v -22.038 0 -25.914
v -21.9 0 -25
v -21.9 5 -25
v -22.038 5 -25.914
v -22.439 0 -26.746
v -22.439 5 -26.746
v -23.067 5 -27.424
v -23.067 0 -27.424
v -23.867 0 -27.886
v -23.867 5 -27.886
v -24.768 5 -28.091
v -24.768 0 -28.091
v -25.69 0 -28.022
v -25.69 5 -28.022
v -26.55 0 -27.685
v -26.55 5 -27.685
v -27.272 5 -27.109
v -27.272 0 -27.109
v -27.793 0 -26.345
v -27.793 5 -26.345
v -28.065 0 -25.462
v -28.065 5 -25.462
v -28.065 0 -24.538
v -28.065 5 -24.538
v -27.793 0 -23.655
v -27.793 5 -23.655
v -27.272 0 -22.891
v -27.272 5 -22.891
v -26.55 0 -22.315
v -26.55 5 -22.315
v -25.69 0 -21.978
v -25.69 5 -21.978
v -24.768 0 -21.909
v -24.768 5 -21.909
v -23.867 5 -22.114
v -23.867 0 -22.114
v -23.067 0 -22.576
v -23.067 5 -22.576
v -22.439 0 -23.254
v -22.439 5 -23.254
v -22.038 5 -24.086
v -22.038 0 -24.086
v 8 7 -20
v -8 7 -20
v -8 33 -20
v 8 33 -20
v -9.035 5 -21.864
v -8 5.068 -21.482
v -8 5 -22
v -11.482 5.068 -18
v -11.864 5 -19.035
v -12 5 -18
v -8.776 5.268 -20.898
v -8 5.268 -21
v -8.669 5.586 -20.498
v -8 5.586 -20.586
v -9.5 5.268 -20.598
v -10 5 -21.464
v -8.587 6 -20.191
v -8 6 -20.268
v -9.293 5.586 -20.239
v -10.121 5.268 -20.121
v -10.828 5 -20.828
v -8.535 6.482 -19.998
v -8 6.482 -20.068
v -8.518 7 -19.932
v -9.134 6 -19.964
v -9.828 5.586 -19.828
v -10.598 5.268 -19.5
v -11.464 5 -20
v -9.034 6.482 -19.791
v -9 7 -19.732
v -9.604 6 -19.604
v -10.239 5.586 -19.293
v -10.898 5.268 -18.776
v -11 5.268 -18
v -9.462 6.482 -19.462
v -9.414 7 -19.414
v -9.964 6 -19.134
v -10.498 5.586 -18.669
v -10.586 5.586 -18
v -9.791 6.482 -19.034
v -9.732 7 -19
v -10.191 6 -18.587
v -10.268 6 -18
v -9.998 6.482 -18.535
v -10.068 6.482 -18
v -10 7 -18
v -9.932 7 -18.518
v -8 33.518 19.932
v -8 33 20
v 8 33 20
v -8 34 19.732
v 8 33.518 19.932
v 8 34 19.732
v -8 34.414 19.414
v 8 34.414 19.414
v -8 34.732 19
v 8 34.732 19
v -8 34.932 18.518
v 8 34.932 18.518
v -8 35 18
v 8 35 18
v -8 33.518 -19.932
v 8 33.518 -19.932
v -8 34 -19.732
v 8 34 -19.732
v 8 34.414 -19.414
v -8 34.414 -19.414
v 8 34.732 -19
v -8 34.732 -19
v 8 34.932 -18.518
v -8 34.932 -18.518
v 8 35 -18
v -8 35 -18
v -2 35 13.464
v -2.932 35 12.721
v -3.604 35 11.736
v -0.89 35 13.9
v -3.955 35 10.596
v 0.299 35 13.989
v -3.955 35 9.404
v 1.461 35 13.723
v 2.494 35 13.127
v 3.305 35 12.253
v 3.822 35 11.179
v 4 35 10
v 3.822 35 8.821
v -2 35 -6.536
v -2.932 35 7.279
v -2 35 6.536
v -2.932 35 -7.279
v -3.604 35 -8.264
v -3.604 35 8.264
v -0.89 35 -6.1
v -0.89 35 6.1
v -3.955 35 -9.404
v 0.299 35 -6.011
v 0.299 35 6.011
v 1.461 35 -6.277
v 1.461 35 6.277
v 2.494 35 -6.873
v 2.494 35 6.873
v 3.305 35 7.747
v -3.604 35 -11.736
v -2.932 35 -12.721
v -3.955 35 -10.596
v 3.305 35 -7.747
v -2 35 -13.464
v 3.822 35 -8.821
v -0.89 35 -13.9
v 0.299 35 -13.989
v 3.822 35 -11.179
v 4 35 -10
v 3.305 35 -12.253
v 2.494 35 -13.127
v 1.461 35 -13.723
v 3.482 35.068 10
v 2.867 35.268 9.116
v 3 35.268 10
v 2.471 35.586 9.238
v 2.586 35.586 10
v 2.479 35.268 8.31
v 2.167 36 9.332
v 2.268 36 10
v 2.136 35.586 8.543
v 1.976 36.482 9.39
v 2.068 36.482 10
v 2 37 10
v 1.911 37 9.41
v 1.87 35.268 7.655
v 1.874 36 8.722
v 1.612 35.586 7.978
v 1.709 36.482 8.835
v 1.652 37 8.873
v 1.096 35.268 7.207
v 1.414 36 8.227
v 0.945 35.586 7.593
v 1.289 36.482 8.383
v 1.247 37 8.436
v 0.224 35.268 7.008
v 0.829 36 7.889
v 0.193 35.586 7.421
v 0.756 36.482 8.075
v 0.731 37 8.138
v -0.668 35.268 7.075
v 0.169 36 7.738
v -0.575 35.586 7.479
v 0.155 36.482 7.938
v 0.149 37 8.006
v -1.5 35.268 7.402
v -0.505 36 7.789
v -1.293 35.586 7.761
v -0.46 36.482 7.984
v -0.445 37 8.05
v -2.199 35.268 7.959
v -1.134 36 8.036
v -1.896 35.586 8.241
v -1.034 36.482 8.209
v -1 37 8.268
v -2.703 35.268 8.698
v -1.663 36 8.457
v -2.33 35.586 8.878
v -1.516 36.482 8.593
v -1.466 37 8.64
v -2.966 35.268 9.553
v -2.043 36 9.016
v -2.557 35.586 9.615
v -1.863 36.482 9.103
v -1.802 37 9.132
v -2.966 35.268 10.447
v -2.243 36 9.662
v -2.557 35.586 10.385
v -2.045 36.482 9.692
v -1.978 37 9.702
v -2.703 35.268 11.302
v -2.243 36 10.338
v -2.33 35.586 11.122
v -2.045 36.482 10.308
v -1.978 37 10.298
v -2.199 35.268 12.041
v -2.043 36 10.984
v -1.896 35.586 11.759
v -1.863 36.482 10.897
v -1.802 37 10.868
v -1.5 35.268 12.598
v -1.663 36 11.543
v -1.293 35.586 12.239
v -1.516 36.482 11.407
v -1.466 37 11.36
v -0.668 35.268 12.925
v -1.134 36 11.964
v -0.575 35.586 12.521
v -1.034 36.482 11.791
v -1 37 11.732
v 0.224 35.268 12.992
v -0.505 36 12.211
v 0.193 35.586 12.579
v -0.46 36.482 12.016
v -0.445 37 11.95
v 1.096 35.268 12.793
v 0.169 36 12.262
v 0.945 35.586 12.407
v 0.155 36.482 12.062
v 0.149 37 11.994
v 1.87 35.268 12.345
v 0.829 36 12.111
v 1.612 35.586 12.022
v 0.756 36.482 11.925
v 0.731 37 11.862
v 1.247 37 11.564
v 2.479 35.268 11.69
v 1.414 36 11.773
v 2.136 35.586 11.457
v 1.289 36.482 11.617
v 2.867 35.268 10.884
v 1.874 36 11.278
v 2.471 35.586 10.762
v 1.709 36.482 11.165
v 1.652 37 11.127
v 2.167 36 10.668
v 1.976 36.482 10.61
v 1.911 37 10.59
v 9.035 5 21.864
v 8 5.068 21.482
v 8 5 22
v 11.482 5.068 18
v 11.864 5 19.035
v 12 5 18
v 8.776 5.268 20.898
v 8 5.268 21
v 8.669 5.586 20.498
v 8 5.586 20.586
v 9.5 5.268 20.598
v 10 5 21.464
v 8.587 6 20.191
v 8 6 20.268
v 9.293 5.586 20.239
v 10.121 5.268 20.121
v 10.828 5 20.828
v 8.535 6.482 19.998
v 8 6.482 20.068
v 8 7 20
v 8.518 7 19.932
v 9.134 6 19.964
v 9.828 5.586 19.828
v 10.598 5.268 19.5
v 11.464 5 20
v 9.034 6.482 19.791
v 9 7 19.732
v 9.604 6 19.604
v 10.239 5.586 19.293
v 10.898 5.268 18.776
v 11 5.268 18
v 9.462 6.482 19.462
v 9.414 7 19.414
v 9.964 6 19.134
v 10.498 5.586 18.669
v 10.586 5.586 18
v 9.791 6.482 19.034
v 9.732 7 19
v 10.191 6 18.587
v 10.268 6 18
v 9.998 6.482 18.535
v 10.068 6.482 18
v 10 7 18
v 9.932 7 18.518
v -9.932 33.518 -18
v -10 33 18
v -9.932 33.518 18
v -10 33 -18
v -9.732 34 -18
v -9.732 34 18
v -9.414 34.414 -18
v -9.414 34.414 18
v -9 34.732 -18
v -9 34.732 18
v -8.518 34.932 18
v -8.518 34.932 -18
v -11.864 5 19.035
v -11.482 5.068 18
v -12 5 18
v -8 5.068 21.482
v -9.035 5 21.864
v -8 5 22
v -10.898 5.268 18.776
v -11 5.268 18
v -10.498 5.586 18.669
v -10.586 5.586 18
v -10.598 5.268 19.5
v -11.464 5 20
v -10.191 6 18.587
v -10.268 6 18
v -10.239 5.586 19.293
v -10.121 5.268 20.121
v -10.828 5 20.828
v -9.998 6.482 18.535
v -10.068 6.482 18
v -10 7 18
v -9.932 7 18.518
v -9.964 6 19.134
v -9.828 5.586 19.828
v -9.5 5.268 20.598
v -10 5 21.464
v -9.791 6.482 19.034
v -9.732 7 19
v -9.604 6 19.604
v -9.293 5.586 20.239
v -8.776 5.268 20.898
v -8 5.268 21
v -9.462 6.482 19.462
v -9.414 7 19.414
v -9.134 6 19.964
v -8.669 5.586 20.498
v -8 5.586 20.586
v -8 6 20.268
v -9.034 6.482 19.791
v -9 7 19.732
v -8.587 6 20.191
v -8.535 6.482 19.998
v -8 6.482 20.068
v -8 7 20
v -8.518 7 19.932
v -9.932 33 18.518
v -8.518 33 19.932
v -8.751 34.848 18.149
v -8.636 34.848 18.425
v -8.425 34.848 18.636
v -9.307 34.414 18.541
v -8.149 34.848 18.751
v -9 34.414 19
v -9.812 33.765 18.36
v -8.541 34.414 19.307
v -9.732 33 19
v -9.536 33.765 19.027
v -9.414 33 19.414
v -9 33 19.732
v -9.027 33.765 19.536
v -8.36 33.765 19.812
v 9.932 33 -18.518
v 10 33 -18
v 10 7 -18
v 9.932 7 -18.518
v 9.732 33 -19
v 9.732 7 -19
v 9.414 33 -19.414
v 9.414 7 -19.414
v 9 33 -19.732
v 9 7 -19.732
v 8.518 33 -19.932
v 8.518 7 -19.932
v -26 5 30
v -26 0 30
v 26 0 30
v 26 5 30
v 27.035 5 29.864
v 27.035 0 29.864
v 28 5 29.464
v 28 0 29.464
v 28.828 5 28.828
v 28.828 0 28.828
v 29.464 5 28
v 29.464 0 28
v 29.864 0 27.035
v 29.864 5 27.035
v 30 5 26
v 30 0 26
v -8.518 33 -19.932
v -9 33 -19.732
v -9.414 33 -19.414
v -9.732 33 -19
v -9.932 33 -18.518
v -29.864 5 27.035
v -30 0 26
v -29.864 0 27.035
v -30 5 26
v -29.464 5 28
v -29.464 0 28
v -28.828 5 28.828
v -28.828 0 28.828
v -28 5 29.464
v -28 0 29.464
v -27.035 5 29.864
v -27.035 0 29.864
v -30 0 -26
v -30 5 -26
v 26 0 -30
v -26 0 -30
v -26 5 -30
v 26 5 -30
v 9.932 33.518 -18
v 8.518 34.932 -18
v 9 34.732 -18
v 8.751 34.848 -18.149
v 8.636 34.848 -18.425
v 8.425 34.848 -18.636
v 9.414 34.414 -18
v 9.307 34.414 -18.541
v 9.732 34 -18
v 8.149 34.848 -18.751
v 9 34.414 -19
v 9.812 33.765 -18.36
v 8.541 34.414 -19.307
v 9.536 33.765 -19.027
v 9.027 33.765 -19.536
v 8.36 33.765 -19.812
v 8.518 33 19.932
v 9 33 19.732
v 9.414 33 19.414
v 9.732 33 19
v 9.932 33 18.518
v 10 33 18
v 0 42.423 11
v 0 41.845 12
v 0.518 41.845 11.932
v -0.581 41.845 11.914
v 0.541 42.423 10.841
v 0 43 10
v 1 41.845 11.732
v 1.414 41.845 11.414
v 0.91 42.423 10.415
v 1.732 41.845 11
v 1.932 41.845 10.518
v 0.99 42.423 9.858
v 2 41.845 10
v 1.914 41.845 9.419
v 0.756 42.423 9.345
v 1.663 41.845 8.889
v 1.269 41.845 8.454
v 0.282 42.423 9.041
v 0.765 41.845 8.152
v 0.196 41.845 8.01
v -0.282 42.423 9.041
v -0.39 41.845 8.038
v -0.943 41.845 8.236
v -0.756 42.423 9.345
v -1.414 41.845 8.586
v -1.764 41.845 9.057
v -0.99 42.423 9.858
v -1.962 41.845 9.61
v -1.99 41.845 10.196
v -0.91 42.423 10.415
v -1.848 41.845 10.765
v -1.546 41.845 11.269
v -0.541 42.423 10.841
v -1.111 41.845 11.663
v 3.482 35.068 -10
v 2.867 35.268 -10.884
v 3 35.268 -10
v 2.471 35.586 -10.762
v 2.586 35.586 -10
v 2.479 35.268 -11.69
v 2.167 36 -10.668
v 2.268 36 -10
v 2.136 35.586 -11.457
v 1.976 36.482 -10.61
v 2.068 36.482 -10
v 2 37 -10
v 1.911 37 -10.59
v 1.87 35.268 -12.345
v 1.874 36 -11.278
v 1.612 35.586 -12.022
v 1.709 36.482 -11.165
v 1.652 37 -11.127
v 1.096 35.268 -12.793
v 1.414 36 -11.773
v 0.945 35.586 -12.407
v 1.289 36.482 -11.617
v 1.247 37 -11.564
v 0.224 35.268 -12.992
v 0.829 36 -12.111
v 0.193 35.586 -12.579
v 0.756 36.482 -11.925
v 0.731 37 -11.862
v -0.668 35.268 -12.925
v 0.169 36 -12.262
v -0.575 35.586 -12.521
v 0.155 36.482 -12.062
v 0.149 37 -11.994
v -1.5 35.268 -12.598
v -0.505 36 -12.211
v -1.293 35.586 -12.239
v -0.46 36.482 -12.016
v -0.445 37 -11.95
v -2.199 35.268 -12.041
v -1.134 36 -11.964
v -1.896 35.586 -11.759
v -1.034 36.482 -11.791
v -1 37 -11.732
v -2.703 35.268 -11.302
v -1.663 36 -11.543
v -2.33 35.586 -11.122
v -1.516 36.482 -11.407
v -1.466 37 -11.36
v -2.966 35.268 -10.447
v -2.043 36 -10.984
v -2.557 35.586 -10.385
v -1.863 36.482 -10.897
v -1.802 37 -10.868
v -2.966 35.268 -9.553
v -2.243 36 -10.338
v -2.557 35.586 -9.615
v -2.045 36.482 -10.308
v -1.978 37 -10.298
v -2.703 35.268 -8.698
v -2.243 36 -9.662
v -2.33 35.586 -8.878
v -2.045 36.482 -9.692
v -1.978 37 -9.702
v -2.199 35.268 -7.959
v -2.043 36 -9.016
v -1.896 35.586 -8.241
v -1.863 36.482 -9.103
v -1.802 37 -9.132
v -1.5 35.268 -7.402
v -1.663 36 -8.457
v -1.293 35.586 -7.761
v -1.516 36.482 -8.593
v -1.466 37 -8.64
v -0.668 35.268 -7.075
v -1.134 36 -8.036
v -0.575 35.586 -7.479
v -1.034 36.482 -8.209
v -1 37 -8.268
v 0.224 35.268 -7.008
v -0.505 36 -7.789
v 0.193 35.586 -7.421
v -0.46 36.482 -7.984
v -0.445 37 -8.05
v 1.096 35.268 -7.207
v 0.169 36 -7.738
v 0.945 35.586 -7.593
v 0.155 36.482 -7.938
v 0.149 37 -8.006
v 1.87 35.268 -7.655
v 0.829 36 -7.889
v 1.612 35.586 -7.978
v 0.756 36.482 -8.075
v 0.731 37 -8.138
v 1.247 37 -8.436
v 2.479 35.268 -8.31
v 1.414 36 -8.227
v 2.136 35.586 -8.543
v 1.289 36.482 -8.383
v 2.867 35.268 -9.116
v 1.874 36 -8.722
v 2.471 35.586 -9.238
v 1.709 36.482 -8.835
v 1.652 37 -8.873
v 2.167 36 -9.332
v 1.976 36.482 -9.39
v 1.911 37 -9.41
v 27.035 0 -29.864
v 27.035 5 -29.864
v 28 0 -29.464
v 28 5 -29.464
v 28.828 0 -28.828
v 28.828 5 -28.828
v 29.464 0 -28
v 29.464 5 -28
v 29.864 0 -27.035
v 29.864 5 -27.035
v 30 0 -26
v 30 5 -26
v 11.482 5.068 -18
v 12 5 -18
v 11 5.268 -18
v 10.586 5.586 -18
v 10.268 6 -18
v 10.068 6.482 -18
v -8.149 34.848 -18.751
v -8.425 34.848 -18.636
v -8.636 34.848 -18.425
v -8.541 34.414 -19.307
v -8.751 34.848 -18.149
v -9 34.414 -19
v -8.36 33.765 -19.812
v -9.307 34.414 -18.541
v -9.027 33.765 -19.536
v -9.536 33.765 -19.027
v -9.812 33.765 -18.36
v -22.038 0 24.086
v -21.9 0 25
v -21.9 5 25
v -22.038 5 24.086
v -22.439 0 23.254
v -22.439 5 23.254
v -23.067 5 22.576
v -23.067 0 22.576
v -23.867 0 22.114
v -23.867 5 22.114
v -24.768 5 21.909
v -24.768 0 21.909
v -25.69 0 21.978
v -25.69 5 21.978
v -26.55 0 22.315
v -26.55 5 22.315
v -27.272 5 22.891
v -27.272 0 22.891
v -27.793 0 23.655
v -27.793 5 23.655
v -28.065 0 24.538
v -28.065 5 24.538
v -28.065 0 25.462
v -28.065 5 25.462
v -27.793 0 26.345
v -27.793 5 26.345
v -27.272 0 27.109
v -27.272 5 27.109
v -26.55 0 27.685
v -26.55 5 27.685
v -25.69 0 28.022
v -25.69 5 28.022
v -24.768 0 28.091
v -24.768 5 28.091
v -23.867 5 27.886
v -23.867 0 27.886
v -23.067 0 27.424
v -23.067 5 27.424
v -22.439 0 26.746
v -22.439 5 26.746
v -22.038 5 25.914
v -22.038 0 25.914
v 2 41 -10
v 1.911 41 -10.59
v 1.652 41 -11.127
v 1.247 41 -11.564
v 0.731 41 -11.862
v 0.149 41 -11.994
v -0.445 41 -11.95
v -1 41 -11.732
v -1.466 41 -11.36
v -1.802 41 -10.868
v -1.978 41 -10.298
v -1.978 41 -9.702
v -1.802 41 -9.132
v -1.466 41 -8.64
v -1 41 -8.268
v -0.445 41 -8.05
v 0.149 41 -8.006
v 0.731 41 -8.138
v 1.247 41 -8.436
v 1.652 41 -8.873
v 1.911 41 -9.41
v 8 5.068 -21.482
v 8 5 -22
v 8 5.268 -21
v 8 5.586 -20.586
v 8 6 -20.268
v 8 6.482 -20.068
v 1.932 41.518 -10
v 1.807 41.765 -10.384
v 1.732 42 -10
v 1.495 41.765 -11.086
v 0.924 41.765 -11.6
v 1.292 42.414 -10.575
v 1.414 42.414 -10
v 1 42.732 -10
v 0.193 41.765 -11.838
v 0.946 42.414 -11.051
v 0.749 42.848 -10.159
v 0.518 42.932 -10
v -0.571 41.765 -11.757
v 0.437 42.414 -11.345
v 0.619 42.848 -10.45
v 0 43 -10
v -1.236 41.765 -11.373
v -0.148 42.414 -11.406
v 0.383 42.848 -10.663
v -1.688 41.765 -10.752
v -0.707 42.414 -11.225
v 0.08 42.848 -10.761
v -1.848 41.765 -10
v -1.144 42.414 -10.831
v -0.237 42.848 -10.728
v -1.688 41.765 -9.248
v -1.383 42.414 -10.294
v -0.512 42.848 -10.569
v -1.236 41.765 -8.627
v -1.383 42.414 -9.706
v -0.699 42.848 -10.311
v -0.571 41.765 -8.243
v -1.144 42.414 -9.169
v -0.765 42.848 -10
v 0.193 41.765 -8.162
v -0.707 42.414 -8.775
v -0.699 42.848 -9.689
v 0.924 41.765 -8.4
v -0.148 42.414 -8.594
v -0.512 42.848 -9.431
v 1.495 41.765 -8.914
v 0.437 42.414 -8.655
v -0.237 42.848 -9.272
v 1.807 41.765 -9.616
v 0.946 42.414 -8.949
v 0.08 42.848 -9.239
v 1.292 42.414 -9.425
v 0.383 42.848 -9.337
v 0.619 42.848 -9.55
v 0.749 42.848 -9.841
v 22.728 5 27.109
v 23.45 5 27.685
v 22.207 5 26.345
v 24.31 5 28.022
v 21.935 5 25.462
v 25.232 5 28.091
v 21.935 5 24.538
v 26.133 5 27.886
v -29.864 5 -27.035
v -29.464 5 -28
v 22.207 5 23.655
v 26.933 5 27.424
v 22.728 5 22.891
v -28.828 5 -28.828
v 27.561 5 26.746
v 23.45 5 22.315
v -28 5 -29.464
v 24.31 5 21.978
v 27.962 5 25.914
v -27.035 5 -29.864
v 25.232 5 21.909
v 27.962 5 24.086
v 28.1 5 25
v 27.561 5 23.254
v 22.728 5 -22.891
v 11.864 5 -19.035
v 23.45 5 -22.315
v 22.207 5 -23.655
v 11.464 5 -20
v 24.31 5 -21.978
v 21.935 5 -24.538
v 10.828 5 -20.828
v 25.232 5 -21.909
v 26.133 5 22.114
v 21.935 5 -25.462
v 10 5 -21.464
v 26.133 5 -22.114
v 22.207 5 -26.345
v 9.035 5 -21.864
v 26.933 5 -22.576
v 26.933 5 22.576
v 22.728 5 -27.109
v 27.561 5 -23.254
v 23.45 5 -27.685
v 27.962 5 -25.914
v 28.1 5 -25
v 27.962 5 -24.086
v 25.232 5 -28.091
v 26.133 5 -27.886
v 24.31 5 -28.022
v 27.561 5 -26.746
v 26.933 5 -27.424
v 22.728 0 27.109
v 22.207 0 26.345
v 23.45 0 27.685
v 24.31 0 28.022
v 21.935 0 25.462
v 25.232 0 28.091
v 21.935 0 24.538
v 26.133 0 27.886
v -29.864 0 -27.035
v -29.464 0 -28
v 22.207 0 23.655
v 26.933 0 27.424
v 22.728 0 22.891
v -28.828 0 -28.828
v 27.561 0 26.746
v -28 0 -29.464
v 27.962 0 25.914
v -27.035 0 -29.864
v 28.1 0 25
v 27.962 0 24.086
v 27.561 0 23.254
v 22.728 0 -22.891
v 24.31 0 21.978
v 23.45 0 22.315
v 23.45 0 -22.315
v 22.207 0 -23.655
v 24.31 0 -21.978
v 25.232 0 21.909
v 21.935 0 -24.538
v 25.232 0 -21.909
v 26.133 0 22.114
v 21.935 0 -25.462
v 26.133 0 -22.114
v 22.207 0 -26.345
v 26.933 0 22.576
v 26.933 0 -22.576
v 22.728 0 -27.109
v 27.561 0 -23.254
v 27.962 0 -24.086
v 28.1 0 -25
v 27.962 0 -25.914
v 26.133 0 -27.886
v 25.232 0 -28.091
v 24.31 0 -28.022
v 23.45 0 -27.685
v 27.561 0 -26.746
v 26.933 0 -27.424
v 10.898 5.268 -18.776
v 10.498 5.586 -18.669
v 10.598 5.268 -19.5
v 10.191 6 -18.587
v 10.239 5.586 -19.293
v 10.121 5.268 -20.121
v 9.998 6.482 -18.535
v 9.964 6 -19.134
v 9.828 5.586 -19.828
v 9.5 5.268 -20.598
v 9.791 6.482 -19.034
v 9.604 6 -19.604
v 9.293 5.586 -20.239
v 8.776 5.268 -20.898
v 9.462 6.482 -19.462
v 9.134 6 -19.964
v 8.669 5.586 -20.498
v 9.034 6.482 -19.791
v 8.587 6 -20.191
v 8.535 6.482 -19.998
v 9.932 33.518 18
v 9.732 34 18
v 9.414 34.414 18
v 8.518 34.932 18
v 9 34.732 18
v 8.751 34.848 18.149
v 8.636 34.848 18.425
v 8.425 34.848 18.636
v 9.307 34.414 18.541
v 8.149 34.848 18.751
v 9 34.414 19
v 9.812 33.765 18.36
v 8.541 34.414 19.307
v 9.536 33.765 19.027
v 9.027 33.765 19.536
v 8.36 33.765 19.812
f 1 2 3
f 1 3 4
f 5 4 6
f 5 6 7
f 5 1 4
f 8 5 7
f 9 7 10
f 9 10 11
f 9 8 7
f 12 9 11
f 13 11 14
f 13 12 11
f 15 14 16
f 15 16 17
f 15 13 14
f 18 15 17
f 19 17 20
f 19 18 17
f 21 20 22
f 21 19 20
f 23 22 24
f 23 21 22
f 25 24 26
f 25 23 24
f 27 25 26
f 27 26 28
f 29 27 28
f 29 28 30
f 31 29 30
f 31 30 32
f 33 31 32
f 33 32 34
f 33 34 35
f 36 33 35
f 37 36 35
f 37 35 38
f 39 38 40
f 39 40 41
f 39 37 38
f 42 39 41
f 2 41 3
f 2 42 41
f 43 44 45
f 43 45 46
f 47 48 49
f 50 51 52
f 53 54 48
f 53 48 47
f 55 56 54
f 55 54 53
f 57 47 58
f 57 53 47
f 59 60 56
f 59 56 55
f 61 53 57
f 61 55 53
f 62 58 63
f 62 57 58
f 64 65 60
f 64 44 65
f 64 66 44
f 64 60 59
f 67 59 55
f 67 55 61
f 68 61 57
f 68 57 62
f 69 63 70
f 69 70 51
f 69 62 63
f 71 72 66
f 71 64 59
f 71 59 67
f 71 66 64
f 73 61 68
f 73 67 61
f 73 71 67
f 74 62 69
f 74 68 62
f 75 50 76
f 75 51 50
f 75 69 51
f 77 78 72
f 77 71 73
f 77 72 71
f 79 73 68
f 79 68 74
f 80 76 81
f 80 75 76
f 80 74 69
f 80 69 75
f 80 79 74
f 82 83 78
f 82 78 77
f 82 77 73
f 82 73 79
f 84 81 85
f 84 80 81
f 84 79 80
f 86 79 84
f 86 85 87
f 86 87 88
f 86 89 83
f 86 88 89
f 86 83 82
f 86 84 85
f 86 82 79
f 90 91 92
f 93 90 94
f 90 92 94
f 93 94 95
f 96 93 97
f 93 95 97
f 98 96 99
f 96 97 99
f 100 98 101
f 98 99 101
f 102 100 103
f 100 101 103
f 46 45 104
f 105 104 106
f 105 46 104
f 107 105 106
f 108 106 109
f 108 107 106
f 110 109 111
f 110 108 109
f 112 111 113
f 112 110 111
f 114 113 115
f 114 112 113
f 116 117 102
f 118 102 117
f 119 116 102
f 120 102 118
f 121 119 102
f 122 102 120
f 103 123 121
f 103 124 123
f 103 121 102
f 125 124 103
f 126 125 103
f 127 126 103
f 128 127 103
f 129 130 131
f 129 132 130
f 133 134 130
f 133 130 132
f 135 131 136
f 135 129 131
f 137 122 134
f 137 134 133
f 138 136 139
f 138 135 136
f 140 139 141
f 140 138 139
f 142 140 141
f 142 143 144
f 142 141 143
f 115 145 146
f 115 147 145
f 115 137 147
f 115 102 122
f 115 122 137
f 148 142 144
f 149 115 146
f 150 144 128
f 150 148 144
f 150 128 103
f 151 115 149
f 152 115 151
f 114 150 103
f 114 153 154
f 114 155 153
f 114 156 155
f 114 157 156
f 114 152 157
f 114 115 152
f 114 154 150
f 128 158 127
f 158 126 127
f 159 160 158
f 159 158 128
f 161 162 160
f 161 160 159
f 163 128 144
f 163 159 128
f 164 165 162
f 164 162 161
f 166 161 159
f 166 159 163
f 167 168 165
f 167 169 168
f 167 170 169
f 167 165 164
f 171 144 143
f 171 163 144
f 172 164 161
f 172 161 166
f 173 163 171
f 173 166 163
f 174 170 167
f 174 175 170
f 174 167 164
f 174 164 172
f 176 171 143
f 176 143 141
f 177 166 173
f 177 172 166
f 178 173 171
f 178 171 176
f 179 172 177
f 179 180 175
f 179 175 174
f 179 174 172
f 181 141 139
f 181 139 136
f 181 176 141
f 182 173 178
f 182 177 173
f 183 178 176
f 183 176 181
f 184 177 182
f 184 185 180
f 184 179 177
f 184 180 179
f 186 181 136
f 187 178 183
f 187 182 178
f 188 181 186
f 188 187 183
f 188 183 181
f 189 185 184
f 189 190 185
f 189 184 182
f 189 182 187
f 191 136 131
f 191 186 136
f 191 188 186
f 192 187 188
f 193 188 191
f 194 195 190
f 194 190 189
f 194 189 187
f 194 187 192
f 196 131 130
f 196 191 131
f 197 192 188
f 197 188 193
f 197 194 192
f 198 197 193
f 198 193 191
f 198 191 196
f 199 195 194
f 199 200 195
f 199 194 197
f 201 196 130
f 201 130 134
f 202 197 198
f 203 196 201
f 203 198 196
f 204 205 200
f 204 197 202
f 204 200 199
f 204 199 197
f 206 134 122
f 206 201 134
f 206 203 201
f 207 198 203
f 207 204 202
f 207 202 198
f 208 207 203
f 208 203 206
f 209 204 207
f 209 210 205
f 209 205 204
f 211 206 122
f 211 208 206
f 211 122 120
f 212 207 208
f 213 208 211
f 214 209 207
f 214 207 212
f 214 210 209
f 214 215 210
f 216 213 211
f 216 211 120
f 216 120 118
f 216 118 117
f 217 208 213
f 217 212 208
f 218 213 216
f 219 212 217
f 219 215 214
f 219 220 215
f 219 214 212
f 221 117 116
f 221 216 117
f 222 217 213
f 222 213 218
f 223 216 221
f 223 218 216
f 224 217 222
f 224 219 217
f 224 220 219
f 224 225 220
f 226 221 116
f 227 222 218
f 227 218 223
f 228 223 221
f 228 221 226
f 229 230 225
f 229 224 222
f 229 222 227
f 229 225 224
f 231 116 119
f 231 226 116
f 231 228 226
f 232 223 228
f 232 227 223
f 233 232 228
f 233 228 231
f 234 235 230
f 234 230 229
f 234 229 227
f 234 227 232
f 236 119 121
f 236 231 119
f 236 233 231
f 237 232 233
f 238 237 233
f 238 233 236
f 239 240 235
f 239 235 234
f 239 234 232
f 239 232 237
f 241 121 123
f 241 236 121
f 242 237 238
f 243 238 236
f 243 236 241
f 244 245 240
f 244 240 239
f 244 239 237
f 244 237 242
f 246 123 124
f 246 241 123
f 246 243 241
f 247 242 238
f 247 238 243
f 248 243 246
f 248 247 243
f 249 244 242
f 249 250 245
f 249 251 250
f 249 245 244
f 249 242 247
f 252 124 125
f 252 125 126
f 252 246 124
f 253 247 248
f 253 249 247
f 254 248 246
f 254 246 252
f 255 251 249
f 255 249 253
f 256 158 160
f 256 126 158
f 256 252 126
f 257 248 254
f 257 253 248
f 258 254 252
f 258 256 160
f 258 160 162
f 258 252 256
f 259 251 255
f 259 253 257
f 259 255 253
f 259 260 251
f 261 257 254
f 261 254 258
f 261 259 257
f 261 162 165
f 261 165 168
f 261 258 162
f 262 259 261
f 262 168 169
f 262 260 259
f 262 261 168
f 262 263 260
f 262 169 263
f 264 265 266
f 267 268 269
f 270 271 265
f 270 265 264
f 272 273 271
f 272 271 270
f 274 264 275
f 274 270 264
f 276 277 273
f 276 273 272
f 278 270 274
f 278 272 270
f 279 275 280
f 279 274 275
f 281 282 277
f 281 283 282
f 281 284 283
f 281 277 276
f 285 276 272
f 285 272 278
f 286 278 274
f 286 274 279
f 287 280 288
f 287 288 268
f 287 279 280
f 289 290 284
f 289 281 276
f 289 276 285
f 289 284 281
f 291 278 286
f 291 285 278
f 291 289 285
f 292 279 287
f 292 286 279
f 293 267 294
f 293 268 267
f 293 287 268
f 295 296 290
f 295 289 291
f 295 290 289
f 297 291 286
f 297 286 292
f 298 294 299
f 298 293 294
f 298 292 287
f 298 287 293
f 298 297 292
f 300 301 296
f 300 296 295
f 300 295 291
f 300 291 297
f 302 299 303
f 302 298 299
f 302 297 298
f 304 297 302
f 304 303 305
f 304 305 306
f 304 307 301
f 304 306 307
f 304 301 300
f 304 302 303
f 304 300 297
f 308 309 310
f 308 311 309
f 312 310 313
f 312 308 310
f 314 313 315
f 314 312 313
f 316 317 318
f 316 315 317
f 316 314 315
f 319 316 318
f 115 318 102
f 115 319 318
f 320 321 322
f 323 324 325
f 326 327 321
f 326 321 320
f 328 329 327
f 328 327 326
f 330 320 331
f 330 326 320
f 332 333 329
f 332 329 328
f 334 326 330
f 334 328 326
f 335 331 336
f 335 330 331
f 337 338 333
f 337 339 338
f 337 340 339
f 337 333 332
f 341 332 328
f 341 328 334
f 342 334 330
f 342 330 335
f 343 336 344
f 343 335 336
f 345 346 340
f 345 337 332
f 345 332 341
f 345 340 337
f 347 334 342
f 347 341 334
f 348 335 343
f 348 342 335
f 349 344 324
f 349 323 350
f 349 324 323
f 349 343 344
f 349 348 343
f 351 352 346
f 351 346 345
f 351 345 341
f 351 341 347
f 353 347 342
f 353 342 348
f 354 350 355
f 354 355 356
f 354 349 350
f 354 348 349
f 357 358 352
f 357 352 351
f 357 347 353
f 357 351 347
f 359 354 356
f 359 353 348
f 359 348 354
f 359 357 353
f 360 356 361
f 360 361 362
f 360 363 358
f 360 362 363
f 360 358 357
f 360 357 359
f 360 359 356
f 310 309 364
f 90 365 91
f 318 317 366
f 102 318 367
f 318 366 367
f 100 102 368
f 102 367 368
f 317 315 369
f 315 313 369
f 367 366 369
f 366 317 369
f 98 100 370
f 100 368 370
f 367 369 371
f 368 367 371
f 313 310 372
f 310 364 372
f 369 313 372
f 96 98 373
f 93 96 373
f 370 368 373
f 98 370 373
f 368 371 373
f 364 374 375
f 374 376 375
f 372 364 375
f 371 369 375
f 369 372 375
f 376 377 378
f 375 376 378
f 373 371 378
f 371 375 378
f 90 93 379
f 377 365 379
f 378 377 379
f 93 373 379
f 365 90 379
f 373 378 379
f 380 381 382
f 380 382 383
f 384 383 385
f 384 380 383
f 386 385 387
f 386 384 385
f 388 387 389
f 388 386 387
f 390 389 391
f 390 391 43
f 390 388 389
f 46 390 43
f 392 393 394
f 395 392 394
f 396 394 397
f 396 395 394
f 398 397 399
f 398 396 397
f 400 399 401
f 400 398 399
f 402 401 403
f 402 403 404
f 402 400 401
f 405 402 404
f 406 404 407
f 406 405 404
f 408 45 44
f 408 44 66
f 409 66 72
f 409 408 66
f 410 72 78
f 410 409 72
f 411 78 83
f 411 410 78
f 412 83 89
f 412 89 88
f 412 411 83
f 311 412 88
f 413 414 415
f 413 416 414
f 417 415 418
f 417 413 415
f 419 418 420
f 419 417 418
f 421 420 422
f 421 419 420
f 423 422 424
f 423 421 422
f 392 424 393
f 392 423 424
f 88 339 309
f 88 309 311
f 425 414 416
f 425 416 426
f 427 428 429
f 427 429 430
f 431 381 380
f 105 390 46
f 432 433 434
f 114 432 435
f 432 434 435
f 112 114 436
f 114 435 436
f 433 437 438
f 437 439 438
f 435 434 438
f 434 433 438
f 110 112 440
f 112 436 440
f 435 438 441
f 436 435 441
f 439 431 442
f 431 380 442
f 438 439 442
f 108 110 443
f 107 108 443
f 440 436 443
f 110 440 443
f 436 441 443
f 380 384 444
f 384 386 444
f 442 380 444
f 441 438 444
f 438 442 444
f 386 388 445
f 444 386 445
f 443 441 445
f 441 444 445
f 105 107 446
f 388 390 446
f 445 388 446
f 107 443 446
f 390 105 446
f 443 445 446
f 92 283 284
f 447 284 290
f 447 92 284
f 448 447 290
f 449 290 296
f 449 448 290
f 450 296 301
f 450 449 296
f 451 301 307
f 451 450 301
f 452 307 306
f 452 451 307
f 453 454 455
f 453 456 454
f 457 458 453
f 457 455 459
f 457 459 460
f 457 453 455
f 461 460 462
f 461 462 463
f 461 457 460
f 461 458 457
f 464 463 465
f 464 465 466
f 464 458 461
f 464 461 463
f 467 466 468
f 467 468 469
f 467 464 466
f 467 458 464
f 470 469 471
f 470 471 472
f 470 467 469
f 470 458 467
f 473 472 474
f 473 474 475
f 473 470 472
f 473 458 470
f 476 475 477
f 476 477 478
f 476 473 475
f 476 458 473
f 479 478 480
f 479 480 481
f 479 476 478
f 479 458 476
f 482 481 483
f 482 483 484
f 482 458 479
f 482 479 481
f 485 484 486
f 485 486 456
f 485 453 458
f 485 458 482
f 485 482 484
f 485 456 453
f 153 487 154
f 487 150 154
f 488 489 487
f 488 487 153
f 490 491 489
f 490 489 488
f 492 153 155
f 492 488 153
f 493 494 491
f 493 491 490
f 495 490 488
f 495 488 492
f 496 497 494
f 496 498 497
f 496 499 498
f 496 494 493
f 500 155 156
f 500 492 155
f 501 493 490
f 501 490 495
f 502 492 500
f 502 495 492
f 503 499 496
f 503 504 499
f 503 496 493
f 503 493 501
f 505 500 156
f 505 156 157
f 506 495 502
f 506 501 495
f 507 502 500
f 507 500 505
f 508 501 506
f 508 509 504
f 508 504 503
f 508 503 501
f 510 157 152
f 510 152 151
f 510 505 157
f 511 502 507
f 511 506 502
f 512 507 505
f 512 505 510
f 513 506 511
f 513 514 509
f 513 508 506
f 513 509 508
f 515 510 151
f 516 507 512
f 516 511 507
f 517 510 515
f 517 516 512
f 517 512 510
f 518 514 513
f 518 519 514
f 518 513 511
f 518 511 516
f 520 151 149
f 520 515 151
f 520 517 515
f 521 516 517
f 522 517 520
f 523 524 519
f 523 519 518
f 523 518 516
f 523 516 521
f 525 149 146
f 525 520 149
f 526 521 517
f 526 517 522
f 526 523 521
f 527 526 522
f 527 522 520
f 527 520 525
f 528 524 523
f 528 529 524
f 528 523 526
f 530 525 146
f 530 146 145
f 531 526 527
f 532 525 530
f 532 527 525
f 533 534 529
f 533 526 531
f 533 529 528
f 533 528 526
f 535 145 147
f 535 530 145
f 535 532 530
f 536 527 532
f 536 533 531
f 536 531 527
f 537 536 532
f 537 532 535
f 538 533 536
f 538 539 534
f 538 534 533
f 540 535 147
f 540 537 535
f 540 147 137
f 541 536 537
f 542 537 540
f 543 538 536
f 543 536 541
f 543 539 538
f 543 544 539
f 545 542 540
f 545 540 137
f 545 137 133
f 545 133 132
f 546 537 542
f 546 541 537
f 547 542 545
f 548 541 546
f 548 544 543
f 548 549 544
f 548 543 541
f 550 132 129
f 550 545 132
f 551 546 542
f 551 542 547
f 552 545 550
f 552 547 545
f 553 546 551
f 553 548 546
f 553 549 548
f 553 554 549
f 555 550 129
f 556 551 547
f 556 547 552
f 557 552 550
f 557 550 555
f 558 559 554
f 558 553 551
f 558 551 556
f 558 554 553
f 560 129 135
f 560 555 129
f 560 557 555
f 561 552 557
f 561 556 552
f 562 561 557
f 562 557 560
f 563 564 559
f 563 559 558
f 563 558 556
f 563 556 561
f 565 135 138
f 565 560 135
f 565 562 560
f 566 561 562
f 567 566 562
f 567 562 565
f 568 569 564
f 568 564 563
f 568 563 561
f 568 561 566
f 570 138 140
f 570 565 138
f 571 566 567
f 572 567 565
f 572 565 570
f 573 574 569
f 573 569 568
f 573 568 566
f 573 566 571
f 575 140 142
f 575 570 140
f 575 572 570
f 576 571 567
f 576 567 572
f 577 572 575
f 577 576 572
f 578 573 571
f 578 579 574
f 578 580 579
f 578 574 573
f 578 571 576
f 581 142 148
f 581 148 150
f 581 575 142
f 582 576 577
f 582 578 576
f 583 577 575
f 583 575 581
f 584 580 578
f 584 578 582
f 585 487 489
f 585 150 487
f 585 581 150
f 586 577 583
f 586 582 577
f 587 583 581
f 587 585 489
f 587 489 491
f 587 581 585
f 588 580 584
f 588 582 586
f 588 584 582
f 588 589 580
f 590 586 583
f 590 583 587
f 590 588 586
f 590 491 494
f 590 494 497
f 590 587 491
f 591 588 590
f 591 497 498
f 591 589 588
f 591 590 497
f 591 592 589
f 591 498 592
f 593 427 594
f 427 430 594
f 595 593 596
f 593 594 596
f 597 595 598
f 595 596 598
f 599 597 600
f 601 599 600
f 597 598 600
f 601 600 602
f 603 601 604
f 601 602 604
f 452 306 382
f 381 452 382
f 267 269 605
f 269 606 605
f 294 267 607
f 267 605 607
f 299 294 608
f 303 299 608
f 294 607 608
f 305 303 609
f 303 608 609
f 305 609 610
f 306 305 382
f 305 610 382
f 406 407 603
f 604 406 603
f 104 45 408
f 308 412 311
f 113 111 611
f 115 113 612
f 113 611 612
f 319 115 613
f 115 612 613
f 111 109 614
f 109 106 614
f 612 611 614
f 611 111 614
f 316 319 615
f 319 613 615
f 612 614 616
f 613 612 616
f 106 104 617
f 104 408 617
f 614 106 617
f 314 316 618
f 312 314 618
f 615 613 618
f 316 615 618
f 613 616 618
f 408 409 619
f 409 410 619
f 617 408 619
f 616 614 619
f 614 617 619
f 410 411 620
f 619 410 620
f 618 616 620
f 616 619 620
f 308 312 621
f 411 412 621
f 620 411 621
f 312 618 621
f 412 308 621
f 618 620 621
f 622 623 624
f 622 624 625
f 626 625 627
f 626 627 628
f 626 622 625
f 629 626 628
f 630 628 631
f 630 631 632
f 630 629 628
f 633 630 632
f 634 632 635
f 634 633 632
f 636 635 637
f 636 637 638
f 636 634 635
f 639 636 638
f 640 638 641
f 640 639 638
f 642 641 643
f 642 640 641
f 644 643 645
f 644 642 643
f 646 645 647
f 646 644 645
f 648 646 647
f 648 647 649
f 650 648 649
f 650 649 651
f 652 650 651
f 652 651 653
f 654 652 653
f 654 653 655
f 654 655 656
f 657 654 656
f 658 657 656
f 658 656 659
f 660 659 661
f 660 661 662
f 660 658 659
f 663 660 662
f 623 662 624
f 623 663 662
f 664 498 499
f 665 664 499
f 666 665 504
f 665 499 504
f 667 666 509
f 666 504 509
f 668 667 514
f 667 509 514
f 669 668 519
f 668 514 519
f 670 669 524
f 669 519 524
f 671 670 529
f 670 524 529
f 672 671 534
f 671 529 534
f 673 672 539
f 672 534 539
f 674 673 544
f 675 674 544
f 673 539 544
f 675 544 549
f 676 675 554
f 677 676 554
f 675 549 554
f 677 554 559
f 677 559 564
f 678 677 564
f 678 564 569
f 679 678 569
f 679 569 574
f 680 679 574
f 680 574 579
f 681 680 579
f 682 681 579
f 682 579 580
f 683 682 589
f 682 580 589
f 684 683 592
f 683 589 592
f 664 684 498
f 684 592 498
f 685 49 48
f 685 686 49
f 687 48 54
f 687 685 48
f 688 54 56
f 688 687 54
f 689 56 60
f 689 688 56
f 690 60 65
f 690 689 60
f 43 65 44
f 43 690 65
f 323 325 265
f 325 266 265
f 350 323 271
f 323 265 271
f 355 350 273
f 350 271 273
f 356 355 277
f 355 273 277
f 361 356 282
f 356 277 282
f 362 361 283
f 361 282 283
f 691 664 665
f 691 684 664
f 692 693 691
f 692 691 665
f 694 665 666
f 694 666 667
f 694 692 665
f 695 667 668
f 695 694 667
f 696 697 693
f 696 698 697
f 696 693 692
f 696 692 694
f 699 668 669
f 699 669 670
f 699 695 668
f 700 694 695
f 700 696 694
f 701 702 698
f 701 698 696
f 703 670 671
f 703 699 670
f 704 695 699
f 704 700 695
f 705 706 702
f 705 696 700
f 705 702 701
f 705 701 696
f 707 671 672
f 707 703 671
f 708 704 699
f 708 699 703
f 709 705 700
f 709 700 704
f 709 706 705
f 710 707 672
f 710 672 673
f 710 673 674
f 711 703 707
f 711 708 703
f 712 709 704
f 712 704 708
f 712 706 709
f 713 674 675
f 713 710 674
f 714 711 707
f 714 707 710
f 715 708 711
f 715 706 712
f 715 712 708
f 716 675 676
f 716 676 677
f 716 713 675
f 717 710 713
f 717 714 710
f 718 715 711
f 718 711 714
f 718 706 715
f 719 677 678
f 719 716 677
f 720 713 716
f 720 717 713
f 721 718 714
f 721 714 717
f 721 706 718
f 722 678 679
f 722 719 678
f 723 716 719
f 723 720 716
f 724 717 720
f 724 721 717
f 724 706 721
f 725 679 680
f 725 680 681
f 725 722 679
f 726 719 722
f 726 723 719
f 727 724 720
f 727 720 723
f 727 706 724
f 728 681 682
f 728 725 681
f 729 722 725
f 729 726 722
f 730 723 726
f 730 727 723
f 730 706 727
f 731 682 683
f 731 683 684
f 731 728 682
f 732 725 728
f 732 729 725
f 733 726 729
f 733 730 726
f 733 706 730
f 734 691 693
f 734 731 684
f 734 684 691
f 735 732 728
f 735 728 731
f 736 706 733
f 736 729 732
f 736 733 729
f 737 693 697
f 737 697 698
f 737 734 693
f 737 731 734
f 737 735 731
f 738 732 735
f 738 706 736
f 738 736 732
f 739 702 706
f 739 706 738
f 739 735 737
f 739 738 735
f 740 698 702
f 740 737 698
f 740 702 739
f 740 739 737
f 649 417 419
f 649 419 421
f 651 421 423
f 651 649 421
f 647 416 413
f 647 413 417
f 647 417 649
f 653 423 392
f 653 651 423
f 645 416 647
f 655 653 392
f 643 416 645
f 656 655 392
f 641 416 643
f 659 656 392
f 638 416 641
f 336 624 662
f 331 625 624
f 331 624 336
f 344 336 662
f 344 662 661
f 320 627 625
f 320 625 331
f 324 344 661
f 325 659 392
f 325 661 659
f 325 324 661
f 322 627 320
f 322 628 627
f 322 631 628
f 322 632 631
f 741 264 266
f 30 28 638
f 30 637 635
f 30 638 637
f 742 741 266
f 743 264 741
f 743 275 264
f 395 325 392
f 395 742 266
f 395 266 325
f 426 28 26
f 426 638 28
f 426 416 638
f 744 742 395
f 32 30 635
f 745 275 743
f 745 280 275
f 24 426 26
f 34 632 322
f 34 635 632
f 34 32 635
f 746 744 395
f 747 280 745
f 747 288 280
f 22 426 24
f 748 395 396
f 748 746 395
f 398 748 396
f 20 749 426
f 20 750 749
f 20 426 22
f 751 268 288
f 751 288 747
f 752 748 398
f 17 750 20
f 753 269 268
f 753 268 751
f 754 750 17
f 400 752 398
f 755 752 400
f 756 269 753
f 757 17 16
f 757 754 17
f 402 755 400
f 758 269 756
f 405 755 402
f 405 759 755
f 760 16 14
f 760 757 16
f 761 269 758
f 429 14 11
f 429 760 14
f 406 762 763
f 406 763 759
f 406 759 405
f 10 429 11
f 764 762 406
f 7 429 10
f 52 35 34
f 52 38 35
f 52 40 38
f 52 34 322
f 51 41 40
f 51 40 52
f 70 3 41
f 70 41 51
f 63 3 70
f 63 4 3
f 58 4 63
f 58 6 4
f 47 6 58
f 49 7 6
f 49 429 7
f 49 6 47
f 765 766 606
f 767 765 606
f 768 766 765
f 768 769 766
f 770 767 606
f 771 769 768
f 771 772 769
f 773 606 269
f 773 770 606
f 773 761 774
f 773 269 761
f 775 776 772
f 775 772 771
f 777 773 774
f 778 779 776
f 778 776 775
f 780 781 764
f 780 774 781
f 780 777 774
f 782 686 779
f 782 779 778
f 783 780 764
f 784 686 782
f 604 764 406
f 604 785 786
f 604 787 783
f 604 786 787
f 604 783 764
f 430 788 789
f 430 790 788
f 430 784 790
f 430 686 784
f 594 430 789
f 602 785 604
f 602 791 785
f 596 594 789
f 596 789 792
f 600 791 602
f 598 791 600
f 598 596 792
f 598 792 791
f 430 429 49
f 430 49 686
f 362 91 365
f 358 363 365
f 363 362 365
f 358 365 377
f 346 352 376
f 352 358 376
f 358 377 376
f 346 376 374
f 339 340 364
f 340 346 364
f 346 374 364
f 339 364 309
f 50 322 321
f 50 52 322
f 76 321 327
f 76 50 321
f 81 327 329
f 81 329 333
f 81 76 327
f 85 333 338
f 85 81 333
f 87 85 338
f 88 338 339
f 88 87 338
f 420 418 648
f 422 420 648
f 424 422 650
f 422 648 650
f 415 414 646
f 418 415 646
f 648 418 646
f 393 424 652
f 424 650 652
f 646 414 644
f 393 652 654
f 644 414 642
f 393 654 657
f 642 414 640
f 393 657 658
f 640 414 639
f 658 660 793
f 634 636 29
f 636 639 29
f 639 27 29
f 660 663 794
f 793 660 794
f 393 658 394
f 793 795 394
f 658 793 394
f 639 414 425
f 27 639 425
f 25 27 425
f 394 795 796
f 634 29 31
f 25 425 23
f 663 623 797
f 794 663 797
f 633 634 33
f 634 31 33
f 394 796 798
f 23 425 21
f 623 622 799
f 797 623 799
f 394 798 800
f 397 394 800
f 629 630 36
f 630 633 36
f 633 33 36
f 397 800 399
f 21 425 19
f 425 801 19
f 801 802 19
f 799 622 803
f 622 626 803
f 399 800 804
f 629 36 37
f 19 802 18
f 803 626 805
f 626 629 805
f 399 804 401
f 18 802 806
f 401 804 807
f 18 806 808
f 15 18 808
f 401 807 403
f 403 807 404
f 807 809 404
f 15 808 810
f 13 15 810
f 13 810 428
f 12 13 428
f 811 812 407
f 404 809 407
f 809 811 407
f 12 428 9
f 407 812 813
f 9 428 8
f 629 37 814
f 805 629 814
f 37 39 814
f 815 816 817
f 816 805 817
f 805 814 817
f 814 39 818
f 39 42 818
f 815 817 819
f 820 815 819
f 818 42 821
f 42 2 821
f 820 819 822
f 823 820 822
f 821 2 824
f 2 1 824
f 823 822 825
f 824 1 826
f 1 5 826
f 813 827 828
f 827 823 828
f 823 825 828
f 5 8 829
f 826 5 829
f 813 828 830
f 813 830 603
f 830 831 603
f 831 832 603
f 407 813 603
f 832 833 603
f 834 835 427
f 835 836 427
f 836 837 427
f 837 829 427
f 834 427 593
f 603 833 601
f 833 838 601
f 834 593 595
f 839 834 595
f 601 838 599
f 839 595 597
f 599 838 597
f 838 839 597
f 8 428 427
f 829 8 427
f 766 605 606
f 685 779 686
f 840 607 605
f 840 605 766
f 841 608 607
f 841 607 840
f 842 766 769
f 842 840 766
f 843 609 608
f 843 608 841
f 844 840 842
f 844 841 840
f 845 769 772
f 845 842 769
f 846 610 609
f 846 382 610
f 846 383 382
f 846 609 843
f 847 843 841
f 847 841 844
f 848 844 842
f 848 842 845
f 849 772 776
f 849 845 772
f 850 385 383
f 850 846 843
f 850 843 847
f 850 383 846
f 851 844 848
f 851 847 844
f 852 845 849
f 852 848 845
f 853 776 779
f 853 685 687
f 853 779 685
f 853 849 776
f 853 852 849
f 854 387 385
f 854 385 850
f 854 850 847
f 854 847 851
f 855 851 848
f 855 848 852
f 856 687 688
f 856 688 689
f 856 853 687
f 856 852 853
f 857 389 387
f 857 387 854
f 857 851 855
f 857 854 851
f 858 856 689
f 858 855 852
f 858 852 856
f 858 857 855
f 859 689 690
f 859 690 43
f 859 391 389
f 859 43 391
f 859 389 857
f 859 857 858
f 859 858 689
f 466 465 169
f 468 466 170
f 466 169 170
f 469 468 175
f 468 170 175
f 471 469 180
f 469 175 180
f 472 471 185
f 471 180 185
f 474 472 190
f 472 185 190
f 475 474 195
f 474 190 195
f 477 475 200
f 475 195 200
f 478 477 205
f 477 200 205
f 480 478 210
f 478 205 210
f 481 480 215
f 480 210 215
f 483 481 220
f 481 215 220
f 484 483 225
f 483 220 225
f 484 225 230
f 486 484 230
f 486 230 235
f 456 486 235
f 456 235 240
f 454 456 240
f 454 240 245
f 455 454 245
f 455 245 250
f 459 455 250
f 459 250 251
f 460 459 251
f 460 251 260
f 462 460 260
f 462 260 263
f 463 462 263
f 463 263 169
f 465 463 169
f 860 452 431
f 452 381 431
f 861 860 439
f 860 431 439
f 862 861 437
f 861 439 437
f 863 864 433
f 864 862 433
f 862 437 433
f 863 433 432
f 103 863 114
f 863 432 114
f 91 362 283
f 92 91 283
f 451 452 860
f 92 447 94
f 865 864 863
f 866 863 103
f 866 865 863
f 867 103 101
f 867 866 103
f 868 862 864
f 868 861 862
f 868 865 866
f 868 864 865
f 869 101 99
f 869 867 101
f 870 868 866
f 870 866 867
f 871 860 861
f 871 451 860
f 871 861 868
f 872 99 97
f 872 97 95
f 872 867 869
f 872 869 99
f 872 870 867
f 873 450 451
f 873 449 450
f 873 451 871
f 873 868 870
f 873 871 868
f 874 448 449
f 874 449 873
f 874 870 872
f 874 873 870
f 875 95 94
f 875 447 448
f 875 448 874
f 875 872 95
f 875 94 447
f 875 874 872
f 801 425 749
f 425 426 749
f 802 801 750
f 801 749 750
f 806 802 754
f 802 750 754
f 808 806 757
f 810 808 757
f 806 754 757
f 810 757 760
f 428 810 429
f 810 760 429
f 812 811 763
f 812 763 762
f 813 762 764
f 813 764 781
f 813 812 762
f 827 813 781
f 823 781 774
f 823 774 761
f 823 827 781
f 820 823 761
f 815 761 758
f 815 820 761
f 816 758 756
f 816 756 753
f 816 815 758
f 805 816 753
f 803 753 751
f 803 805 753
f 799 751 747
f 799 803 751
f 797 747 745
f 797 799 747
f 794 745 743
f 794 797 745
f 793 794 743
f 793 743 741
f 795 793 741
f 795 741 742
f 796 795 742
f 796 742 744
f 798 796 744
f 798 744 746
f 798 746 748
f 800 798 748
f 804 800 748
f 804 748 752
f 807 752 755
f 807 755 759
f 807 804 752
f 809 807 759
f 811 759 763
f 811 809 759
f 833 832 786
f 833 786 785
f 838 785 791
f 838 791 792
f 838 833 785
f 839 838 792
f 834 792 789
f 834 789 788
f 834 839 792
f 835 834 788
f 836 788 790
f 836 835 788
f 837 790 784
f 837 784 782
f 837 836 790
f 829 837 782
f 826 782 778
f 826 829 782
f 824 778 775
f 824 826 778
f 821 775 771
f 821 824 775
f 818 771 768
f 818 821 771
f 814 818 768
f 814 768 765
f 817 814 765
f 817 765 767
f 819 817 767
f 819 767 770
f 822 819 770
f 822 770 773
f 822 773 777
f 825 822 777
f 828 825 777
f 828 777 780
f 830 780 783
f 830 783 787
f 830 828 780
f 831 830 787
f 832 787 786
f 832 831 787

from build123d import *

# Parameters (mm, degrees)
SKETCH1_W           = 60
SKETCH1_H           = 60
SKETCH1_R           = 3.1
BOSS_EXTRUDE1_DEPTH = 5
SKETCH4_W           = 20
SKETCH4_H           = 40
BOSS_EXTRUDE3_DEPTH = 30
SKETCH2_R           = 2
BOSS_EXTRUDE2_DEPTH = 8
FILLET1_R           = 2
FILLET2_R           = 4
FILLET3_R           = 2


with BuildPart() as part:
    # Sketch1 → Boss-Extrude1 (new body)
    with BuildSketch(Plane(origin=(0, 0, 0), x_dir=(1, 0, 0), z_dir=(0, 1, 0))):
        Rectangle(SKETCH1_W, SKETCH1_H)
        with Locations((-25, 25)):
            Circle(SKETCH1_R, mode=Mode.SUBTRACT)
        with Locations((-25, -25)):
            Circle(SKETCH1_R, mode=Mode.SUBTRACT)
        with Locations((25, -25)):
            Circle(SKETCH1_R, mode=Mode.SUBTRACT)
        with Locations((25, 25)):
            Circle(SKETCH1_R, mode=Mode.SUBTRACT)
    extrude(amount=BOSS_EXTRUDE1_DEPTH)

    # Sketch4 → Boss-Extrude3 (add)
    with BuildSketch(Plane(origin=(0, 5, 0), x_dir=(1, 0, 0), z_dir=(0, 1, 0))):
        Rectangle(SKETCH4_W, SKETCH4_H)
    extrude(amount=BOSS_EXTRUDE3_DEPTH)

    # Sketch2 → Boss-Extrude2 (add)
    with BuildSketch(Plane(origin=(0, 35, 0), x_dir=(1, 0, 0), z_dir=(0, 1, 0))):
        with Locations((0, 10)):
            Circle(SKETCH2_R)
        with Locations((0, -10)):
            Circle(SKETCH2_R)
    extrude(amount=BOSS_EXTRUDE2_DEPTH)

    # Fillet1
    fillet1_edges = [part.edges().sort_by_distance(p)[0] for p in [
        (-2, 35, 10),
        (-2, 35, -10),
        (-2, 43, -10),
    ]]
    fillet(fillet1_edges, radius=FILLET1_R)

    # Fillet2
    fillet2_edges = [part.edges().sort_by_distance(p)[0] for p in [
        (30, 2.5, 30),
        (-30, 2.5, 30),
        (-30, 2.5, -30),
        (30, 2.5, -30),
    ]]
    fillet(fillet2_edges, radius=FILLET2_R)

    # Sketch3 → Cut-Revolve3 (revolve, cut)
    with BuildSketch(Plane(origin=(0, 0, 0), x_dir=(0, 0, -1), z_dir=(1, 0, 0))):
        Polygon((-10, 43), (-10, 44), (-12, 44), (-12, 41.845299462), align=None)
    revolve(axis=Axis((0, 43, 10), (0, 1, 0)), mode=Mode.SUBTRACT)

    # Fillet3
    fillet3_edges = [part.edges().sort_by_distance(p)[0] for p in [
        (10, 5, 0),
        (10, 20, 20),
        (0, 5, -20),
        (10, 20, -20),
        (-10, 5, 0),
        (-10, 20, -20),
        (0, 5, 20),
        (-10, 20, 20),
        (10, 35, 0),
        (0, 35, -20),
        (-10, 35, 0),
        (0, 35, 20),
    ]]
    fillet(fillet3_edges, radius=FILLET3_R)


solid = part.part
